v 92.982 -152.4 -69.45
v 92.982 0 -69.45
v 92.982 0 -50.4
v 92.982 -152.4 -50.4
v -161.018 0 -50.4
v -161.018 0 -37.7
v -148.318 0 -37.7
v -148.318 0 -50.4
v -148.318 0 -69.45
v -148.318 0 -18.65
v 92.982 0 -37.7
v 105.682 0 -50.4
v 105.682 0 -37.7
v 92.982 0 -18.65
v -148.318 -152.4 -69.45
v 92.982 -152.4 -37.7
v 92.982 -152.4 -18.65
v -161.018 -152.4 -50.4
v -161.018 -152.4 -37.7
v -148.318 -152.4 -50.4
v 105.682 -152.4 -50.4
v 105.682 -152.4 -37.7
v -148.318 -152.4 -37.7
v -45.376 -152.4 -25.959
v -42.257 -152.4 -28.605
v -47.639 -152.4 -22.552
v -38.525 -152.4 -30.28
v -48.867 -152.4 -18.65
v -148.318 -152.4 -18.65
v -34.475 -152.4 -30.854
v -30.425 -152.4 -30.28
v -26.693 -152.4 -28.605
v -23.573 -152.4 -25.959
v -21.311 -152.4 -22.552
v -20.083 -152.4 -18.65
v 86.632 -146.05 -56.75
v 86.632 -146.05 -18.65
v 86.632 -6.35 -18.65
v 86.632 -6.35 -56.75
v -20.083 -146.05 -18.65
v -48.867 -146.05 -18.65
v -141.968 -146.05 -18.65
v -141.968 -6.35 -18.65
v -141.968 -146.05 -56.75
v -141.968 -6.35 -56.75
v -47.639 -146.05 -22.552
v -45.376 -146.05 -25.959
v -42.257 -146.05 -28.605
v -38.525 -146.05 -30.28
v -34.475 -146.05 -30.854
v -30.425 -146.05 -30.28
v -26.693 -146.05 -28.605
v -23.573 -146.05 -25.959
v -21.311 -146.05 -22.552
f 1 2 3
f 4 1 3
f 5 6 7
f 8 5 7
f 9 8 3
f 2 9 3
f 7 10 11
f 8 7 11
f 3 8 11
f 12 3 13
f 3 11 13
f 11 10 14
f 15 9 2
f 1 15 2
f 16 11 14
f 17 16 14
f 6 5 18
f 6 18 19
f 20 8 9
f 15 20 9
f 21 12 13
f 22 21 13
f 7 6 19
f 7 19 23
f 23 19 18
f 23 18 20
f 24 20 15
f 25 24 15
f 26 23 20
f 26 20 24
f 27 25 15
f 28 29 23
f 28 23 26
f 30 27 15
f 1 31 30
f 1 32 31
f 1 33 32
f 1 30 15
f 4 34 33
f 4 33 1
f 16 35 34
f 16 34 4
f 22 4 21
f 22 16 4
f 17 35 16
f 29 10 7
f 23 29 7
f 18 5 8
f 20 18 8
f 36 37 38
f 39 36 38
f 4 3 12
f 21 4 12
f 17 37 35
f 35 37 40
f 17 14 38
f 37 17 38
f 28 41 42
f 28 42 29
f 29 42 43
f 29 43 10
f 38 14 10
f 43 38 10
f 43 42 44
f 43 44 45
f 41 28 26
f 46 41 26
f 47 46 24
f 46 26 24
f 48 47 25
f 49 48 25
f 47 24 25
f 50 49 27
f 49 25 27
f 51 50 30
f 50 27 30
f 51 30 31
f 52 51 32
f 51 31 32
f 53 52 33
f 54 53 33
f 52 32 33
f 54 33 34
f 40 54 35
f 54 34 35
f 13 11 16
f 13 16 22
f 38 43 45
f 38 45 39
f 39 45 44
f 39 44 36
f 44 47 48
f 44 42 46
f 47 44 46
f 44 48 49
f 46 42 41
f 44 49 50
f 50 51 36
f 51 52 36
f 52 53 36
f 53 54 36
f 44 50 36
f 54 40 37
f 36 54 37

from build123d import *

# Parameters (mm, degrees)
F0_W     = 12.7
F0_H     = 12.7
F1_DEPTH = 152.4
F2_W     = 228.6
F2_H     = 139.7
F3_DEPTH = 38.1
F5_DEPTH = 6.35


with BuildPart() as f1:
    # F0 (on Front) → F1 (new body)
    with BuildSketch(Plane.XZ):
        with Locations((-154.667671, -44.050034)):
            Rectangle(F0_W, F0_H)
        Polygon((92.982329, -18.650034), (-148.317671, -18.650034), (-148.317671, -37.700034), (-148.317671, -50.400034), (-148.317671, -69.450034), (92.982329, -69.450034), (92.982329, -50.400034), (92.982329, -37.700034), align=None)
        with Locations((99.332329, -44.050034)):
            Rectangle(F0_W, F0_H)
    extrude(amount=F1_DEPTH)

    # F2 (on face) → F3 (cut)
    with BuildSketch(Plane.XY.offset(-18.650034)):
        with Locations((-27.667671, -76.2)):
            Rectangle(F2_W, F2_H)
    extrude(amount=-F3_DEPTH, mode=Mode.SUBTRACT)

    # F4 (on face) → F5 (cut)
    with BuildSketch(Plane.XZ.offset(152.4)):
        with BuildLine():
            Line((-20.082708, -18.650034), (-48.866976, -18.650034))
            ThreePointArc((-48.866976, -18.650034), (-34.474842, -30.853539), (-20.082708, -18.650034))
        make_face()
    extrude(amount=-F5_DEPTH, mode=Mode.SUBTRACT)


solid = f1.part
